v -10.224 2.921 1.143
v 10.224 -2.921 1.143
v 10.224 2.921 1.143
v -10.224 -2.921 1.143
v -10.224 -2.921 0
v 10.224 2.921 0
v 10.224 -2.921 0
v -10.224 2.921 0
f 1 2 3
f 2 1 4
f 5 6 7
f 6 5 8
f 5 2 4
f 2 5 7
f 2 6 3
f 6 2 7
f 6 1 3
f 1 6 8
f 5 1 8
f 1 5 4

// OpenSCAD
// file: ../lib/common.scad
// Shared helpers for the AR turntable part models.
//
// Every part file holds a parameter table P. Each row is:
//   [id, description, value_mm, evidence, display_unit, source_or_how_to_check]
//
// Evidence codes:
//   F  factory document          O  owner report
//   C  community drawing         S  industry standard
//   D  design choice             M  measured for this repository
//   DV derived from cited sources, not yet verified on a part. The source
//      column holds the derivation: the formula, each input with its source,
//      and how to verify. Drawn in blue. Needs a row in TO-CONFIRM.md whose
//      value starts with "Derived:". Change to M once measured.
//   PH placeholder: chosen only so the model has a shape. It is NOT a
//      measurement. Drawn in red. Replace it, and change the code, once it
//      is measured.
//
// Every part file also emits metadata naming the part page, the part, the
// version, the material and the tables it fits, each fit with its evidence:
//   ["part", "parts/counterweight.md"], ["part_name", "Counterweight"],
//   ["version", "XA brass weight, 1961 to 1979"], ["material", "Brass"],
//   ["fits", [["XA", "Fitted by AR", "XA service manual p. 4"], ["XB", "Unconfirmed", ""]]]
// The fit word is one of: Fitted by AR, Fits, Fits with a change, Does not
// fit, Unconfirmed. build.py prints these in the title block and writes the
// drawings table of cad/README.md from them.
// License: CC BY-SA 4.0. See LICENSE at the repository root.

IN = 25.4;      // one inch, in mm. All model geometry is in mm.
EPS = 0.01;     // overlap so boolean cuts do not leave zero-thickness skins
$fa = 2;
$fs = 0.1;

// Value of parameter `id` in table t.
function pv(t, id) = t[search([id], t)[0]][2];

// Print part data for cad/tools/build.py, which reads it from the console.
module emit(meta, params, dims = []) {
    echo(META = meta);
    for (row = params) echo(PARAM = row);
    for (row = dims) echo(DIM = row);
}

// Rounded rectangle prism: centered in XY, from z = 0 to z = h.
module rr_prism(l, w, h, r) {
    translate([-l / 2 + r, -w / 2, 0]) cube([l - 2 * r, w, h]);
    translate([-l / 2, -w / 2 + r, 0]) cube([l, w - 2 * r, h]);
    for (sx = [-1, 1], sy = [-1, 1])
        translate([sx * (l / 2 - r), sy * (w / 2 - r), 0]) cylinder(r = r, h = h);
}

// Slot along X: `c` is the distance between end-radius centers.
module slot_prism(c, w, h) {
    translate([-c / 2, -w / 2, 0]) cube([c, w, h]);
    for (sx = [-1, 1]) translate([sx * c / 2, 0, 0]) cylinder(d = w, h = h);
}
// main file
// XA/XB cartridge shim block, thicknesses #1 to #3.
// All dimensions are from the RDW hardware drawing, December 7, 2023:
// docs/originals/ar-headshell-hardware-rev-1.pdf
// License: CC BY-SA 4.0. See LICENSE at the repository root.
include <../lib/common.scad>

variant = 1;   // 1, 2, or 3
flat = false;  // true exports the 1:1 cutting outline

thicknesses = [0.045, 0.080, 0.125];

P = [
    ["SH1", "Length", 0.805 * IN, "C", "in", "RDW hardware drawing"],
    ["SH2", "Width", 0.230 * IN, "C", "in", "RDW hardware drawing"],
    ["SH3", "Thickness for this size", thicknesses[variant - 1] * IN, "C", "in", "RDW hardware drawing: 0.045, 0.080, 0.125 in"],
];

l = pv(P, "SH1");
w = pv(P, "SH2");
t = pv(P, "SH3");

module part() {
    translate([-l / 2, -w / 2, 0]) cube([l, w, t]);
}

emit(
    [
        ["id", "shim-block-xa-xb-cardboard"],
        ["title", "Cartridge shim block, XA and XB"],
        ["status", "GEOMETRY COMPLETE"],
        ["part", "parts/cartridge-hardware.md"],
        ["part_name", "Cartridge screws, bushings and shims"],
        ["version", "XA and XB hardware set, thicknesses #1 to #3"],
        ["scope", "Original-style XA/XB hardware set. Community drawing, not an AR factory drawing"],
        ["material", "Cardboard, per the drawing"],
        ["density", 0.7],
        ["fits", [["XA", "Fitted by AR", "sheet L-1591 names the shim block; sizes from the community drawing of XA and XB sets"],
                  ["XB", "Fitted by AR", "same two sources"], ["AR77XB", "Unconfirmed", ""]]],
        ["make", "Cut from sheet. 1 of each thickness per set"],
        ["flat", true],
        ["variants", [[1, "#1, 0.045 in"], [2, "#2, 0.080 in"], [3, "#3, 0.125 in"]]],
        ["views", ["front", "top", "right", "iso"]],
        ["notes", [
            "AR sheet L-1591: the shim block goes under the front of the cartridge where its table calls for one.",
        ]],
    ],
    P,
    [
        ["top", "h", [-l / 2, 0, 0], [l / 2, 0, 0], 9, "SH1"],
        ["top", "v", [l / 2, -w / 2, 0], [l / 2, w / 2, 0], 9, "SH2"],
        ["front", "v", [l / 2, 0, 0], [l / 2, 0, t], 9, "SH3"],
    ]
);

if (flat) projection() part(); else part();
